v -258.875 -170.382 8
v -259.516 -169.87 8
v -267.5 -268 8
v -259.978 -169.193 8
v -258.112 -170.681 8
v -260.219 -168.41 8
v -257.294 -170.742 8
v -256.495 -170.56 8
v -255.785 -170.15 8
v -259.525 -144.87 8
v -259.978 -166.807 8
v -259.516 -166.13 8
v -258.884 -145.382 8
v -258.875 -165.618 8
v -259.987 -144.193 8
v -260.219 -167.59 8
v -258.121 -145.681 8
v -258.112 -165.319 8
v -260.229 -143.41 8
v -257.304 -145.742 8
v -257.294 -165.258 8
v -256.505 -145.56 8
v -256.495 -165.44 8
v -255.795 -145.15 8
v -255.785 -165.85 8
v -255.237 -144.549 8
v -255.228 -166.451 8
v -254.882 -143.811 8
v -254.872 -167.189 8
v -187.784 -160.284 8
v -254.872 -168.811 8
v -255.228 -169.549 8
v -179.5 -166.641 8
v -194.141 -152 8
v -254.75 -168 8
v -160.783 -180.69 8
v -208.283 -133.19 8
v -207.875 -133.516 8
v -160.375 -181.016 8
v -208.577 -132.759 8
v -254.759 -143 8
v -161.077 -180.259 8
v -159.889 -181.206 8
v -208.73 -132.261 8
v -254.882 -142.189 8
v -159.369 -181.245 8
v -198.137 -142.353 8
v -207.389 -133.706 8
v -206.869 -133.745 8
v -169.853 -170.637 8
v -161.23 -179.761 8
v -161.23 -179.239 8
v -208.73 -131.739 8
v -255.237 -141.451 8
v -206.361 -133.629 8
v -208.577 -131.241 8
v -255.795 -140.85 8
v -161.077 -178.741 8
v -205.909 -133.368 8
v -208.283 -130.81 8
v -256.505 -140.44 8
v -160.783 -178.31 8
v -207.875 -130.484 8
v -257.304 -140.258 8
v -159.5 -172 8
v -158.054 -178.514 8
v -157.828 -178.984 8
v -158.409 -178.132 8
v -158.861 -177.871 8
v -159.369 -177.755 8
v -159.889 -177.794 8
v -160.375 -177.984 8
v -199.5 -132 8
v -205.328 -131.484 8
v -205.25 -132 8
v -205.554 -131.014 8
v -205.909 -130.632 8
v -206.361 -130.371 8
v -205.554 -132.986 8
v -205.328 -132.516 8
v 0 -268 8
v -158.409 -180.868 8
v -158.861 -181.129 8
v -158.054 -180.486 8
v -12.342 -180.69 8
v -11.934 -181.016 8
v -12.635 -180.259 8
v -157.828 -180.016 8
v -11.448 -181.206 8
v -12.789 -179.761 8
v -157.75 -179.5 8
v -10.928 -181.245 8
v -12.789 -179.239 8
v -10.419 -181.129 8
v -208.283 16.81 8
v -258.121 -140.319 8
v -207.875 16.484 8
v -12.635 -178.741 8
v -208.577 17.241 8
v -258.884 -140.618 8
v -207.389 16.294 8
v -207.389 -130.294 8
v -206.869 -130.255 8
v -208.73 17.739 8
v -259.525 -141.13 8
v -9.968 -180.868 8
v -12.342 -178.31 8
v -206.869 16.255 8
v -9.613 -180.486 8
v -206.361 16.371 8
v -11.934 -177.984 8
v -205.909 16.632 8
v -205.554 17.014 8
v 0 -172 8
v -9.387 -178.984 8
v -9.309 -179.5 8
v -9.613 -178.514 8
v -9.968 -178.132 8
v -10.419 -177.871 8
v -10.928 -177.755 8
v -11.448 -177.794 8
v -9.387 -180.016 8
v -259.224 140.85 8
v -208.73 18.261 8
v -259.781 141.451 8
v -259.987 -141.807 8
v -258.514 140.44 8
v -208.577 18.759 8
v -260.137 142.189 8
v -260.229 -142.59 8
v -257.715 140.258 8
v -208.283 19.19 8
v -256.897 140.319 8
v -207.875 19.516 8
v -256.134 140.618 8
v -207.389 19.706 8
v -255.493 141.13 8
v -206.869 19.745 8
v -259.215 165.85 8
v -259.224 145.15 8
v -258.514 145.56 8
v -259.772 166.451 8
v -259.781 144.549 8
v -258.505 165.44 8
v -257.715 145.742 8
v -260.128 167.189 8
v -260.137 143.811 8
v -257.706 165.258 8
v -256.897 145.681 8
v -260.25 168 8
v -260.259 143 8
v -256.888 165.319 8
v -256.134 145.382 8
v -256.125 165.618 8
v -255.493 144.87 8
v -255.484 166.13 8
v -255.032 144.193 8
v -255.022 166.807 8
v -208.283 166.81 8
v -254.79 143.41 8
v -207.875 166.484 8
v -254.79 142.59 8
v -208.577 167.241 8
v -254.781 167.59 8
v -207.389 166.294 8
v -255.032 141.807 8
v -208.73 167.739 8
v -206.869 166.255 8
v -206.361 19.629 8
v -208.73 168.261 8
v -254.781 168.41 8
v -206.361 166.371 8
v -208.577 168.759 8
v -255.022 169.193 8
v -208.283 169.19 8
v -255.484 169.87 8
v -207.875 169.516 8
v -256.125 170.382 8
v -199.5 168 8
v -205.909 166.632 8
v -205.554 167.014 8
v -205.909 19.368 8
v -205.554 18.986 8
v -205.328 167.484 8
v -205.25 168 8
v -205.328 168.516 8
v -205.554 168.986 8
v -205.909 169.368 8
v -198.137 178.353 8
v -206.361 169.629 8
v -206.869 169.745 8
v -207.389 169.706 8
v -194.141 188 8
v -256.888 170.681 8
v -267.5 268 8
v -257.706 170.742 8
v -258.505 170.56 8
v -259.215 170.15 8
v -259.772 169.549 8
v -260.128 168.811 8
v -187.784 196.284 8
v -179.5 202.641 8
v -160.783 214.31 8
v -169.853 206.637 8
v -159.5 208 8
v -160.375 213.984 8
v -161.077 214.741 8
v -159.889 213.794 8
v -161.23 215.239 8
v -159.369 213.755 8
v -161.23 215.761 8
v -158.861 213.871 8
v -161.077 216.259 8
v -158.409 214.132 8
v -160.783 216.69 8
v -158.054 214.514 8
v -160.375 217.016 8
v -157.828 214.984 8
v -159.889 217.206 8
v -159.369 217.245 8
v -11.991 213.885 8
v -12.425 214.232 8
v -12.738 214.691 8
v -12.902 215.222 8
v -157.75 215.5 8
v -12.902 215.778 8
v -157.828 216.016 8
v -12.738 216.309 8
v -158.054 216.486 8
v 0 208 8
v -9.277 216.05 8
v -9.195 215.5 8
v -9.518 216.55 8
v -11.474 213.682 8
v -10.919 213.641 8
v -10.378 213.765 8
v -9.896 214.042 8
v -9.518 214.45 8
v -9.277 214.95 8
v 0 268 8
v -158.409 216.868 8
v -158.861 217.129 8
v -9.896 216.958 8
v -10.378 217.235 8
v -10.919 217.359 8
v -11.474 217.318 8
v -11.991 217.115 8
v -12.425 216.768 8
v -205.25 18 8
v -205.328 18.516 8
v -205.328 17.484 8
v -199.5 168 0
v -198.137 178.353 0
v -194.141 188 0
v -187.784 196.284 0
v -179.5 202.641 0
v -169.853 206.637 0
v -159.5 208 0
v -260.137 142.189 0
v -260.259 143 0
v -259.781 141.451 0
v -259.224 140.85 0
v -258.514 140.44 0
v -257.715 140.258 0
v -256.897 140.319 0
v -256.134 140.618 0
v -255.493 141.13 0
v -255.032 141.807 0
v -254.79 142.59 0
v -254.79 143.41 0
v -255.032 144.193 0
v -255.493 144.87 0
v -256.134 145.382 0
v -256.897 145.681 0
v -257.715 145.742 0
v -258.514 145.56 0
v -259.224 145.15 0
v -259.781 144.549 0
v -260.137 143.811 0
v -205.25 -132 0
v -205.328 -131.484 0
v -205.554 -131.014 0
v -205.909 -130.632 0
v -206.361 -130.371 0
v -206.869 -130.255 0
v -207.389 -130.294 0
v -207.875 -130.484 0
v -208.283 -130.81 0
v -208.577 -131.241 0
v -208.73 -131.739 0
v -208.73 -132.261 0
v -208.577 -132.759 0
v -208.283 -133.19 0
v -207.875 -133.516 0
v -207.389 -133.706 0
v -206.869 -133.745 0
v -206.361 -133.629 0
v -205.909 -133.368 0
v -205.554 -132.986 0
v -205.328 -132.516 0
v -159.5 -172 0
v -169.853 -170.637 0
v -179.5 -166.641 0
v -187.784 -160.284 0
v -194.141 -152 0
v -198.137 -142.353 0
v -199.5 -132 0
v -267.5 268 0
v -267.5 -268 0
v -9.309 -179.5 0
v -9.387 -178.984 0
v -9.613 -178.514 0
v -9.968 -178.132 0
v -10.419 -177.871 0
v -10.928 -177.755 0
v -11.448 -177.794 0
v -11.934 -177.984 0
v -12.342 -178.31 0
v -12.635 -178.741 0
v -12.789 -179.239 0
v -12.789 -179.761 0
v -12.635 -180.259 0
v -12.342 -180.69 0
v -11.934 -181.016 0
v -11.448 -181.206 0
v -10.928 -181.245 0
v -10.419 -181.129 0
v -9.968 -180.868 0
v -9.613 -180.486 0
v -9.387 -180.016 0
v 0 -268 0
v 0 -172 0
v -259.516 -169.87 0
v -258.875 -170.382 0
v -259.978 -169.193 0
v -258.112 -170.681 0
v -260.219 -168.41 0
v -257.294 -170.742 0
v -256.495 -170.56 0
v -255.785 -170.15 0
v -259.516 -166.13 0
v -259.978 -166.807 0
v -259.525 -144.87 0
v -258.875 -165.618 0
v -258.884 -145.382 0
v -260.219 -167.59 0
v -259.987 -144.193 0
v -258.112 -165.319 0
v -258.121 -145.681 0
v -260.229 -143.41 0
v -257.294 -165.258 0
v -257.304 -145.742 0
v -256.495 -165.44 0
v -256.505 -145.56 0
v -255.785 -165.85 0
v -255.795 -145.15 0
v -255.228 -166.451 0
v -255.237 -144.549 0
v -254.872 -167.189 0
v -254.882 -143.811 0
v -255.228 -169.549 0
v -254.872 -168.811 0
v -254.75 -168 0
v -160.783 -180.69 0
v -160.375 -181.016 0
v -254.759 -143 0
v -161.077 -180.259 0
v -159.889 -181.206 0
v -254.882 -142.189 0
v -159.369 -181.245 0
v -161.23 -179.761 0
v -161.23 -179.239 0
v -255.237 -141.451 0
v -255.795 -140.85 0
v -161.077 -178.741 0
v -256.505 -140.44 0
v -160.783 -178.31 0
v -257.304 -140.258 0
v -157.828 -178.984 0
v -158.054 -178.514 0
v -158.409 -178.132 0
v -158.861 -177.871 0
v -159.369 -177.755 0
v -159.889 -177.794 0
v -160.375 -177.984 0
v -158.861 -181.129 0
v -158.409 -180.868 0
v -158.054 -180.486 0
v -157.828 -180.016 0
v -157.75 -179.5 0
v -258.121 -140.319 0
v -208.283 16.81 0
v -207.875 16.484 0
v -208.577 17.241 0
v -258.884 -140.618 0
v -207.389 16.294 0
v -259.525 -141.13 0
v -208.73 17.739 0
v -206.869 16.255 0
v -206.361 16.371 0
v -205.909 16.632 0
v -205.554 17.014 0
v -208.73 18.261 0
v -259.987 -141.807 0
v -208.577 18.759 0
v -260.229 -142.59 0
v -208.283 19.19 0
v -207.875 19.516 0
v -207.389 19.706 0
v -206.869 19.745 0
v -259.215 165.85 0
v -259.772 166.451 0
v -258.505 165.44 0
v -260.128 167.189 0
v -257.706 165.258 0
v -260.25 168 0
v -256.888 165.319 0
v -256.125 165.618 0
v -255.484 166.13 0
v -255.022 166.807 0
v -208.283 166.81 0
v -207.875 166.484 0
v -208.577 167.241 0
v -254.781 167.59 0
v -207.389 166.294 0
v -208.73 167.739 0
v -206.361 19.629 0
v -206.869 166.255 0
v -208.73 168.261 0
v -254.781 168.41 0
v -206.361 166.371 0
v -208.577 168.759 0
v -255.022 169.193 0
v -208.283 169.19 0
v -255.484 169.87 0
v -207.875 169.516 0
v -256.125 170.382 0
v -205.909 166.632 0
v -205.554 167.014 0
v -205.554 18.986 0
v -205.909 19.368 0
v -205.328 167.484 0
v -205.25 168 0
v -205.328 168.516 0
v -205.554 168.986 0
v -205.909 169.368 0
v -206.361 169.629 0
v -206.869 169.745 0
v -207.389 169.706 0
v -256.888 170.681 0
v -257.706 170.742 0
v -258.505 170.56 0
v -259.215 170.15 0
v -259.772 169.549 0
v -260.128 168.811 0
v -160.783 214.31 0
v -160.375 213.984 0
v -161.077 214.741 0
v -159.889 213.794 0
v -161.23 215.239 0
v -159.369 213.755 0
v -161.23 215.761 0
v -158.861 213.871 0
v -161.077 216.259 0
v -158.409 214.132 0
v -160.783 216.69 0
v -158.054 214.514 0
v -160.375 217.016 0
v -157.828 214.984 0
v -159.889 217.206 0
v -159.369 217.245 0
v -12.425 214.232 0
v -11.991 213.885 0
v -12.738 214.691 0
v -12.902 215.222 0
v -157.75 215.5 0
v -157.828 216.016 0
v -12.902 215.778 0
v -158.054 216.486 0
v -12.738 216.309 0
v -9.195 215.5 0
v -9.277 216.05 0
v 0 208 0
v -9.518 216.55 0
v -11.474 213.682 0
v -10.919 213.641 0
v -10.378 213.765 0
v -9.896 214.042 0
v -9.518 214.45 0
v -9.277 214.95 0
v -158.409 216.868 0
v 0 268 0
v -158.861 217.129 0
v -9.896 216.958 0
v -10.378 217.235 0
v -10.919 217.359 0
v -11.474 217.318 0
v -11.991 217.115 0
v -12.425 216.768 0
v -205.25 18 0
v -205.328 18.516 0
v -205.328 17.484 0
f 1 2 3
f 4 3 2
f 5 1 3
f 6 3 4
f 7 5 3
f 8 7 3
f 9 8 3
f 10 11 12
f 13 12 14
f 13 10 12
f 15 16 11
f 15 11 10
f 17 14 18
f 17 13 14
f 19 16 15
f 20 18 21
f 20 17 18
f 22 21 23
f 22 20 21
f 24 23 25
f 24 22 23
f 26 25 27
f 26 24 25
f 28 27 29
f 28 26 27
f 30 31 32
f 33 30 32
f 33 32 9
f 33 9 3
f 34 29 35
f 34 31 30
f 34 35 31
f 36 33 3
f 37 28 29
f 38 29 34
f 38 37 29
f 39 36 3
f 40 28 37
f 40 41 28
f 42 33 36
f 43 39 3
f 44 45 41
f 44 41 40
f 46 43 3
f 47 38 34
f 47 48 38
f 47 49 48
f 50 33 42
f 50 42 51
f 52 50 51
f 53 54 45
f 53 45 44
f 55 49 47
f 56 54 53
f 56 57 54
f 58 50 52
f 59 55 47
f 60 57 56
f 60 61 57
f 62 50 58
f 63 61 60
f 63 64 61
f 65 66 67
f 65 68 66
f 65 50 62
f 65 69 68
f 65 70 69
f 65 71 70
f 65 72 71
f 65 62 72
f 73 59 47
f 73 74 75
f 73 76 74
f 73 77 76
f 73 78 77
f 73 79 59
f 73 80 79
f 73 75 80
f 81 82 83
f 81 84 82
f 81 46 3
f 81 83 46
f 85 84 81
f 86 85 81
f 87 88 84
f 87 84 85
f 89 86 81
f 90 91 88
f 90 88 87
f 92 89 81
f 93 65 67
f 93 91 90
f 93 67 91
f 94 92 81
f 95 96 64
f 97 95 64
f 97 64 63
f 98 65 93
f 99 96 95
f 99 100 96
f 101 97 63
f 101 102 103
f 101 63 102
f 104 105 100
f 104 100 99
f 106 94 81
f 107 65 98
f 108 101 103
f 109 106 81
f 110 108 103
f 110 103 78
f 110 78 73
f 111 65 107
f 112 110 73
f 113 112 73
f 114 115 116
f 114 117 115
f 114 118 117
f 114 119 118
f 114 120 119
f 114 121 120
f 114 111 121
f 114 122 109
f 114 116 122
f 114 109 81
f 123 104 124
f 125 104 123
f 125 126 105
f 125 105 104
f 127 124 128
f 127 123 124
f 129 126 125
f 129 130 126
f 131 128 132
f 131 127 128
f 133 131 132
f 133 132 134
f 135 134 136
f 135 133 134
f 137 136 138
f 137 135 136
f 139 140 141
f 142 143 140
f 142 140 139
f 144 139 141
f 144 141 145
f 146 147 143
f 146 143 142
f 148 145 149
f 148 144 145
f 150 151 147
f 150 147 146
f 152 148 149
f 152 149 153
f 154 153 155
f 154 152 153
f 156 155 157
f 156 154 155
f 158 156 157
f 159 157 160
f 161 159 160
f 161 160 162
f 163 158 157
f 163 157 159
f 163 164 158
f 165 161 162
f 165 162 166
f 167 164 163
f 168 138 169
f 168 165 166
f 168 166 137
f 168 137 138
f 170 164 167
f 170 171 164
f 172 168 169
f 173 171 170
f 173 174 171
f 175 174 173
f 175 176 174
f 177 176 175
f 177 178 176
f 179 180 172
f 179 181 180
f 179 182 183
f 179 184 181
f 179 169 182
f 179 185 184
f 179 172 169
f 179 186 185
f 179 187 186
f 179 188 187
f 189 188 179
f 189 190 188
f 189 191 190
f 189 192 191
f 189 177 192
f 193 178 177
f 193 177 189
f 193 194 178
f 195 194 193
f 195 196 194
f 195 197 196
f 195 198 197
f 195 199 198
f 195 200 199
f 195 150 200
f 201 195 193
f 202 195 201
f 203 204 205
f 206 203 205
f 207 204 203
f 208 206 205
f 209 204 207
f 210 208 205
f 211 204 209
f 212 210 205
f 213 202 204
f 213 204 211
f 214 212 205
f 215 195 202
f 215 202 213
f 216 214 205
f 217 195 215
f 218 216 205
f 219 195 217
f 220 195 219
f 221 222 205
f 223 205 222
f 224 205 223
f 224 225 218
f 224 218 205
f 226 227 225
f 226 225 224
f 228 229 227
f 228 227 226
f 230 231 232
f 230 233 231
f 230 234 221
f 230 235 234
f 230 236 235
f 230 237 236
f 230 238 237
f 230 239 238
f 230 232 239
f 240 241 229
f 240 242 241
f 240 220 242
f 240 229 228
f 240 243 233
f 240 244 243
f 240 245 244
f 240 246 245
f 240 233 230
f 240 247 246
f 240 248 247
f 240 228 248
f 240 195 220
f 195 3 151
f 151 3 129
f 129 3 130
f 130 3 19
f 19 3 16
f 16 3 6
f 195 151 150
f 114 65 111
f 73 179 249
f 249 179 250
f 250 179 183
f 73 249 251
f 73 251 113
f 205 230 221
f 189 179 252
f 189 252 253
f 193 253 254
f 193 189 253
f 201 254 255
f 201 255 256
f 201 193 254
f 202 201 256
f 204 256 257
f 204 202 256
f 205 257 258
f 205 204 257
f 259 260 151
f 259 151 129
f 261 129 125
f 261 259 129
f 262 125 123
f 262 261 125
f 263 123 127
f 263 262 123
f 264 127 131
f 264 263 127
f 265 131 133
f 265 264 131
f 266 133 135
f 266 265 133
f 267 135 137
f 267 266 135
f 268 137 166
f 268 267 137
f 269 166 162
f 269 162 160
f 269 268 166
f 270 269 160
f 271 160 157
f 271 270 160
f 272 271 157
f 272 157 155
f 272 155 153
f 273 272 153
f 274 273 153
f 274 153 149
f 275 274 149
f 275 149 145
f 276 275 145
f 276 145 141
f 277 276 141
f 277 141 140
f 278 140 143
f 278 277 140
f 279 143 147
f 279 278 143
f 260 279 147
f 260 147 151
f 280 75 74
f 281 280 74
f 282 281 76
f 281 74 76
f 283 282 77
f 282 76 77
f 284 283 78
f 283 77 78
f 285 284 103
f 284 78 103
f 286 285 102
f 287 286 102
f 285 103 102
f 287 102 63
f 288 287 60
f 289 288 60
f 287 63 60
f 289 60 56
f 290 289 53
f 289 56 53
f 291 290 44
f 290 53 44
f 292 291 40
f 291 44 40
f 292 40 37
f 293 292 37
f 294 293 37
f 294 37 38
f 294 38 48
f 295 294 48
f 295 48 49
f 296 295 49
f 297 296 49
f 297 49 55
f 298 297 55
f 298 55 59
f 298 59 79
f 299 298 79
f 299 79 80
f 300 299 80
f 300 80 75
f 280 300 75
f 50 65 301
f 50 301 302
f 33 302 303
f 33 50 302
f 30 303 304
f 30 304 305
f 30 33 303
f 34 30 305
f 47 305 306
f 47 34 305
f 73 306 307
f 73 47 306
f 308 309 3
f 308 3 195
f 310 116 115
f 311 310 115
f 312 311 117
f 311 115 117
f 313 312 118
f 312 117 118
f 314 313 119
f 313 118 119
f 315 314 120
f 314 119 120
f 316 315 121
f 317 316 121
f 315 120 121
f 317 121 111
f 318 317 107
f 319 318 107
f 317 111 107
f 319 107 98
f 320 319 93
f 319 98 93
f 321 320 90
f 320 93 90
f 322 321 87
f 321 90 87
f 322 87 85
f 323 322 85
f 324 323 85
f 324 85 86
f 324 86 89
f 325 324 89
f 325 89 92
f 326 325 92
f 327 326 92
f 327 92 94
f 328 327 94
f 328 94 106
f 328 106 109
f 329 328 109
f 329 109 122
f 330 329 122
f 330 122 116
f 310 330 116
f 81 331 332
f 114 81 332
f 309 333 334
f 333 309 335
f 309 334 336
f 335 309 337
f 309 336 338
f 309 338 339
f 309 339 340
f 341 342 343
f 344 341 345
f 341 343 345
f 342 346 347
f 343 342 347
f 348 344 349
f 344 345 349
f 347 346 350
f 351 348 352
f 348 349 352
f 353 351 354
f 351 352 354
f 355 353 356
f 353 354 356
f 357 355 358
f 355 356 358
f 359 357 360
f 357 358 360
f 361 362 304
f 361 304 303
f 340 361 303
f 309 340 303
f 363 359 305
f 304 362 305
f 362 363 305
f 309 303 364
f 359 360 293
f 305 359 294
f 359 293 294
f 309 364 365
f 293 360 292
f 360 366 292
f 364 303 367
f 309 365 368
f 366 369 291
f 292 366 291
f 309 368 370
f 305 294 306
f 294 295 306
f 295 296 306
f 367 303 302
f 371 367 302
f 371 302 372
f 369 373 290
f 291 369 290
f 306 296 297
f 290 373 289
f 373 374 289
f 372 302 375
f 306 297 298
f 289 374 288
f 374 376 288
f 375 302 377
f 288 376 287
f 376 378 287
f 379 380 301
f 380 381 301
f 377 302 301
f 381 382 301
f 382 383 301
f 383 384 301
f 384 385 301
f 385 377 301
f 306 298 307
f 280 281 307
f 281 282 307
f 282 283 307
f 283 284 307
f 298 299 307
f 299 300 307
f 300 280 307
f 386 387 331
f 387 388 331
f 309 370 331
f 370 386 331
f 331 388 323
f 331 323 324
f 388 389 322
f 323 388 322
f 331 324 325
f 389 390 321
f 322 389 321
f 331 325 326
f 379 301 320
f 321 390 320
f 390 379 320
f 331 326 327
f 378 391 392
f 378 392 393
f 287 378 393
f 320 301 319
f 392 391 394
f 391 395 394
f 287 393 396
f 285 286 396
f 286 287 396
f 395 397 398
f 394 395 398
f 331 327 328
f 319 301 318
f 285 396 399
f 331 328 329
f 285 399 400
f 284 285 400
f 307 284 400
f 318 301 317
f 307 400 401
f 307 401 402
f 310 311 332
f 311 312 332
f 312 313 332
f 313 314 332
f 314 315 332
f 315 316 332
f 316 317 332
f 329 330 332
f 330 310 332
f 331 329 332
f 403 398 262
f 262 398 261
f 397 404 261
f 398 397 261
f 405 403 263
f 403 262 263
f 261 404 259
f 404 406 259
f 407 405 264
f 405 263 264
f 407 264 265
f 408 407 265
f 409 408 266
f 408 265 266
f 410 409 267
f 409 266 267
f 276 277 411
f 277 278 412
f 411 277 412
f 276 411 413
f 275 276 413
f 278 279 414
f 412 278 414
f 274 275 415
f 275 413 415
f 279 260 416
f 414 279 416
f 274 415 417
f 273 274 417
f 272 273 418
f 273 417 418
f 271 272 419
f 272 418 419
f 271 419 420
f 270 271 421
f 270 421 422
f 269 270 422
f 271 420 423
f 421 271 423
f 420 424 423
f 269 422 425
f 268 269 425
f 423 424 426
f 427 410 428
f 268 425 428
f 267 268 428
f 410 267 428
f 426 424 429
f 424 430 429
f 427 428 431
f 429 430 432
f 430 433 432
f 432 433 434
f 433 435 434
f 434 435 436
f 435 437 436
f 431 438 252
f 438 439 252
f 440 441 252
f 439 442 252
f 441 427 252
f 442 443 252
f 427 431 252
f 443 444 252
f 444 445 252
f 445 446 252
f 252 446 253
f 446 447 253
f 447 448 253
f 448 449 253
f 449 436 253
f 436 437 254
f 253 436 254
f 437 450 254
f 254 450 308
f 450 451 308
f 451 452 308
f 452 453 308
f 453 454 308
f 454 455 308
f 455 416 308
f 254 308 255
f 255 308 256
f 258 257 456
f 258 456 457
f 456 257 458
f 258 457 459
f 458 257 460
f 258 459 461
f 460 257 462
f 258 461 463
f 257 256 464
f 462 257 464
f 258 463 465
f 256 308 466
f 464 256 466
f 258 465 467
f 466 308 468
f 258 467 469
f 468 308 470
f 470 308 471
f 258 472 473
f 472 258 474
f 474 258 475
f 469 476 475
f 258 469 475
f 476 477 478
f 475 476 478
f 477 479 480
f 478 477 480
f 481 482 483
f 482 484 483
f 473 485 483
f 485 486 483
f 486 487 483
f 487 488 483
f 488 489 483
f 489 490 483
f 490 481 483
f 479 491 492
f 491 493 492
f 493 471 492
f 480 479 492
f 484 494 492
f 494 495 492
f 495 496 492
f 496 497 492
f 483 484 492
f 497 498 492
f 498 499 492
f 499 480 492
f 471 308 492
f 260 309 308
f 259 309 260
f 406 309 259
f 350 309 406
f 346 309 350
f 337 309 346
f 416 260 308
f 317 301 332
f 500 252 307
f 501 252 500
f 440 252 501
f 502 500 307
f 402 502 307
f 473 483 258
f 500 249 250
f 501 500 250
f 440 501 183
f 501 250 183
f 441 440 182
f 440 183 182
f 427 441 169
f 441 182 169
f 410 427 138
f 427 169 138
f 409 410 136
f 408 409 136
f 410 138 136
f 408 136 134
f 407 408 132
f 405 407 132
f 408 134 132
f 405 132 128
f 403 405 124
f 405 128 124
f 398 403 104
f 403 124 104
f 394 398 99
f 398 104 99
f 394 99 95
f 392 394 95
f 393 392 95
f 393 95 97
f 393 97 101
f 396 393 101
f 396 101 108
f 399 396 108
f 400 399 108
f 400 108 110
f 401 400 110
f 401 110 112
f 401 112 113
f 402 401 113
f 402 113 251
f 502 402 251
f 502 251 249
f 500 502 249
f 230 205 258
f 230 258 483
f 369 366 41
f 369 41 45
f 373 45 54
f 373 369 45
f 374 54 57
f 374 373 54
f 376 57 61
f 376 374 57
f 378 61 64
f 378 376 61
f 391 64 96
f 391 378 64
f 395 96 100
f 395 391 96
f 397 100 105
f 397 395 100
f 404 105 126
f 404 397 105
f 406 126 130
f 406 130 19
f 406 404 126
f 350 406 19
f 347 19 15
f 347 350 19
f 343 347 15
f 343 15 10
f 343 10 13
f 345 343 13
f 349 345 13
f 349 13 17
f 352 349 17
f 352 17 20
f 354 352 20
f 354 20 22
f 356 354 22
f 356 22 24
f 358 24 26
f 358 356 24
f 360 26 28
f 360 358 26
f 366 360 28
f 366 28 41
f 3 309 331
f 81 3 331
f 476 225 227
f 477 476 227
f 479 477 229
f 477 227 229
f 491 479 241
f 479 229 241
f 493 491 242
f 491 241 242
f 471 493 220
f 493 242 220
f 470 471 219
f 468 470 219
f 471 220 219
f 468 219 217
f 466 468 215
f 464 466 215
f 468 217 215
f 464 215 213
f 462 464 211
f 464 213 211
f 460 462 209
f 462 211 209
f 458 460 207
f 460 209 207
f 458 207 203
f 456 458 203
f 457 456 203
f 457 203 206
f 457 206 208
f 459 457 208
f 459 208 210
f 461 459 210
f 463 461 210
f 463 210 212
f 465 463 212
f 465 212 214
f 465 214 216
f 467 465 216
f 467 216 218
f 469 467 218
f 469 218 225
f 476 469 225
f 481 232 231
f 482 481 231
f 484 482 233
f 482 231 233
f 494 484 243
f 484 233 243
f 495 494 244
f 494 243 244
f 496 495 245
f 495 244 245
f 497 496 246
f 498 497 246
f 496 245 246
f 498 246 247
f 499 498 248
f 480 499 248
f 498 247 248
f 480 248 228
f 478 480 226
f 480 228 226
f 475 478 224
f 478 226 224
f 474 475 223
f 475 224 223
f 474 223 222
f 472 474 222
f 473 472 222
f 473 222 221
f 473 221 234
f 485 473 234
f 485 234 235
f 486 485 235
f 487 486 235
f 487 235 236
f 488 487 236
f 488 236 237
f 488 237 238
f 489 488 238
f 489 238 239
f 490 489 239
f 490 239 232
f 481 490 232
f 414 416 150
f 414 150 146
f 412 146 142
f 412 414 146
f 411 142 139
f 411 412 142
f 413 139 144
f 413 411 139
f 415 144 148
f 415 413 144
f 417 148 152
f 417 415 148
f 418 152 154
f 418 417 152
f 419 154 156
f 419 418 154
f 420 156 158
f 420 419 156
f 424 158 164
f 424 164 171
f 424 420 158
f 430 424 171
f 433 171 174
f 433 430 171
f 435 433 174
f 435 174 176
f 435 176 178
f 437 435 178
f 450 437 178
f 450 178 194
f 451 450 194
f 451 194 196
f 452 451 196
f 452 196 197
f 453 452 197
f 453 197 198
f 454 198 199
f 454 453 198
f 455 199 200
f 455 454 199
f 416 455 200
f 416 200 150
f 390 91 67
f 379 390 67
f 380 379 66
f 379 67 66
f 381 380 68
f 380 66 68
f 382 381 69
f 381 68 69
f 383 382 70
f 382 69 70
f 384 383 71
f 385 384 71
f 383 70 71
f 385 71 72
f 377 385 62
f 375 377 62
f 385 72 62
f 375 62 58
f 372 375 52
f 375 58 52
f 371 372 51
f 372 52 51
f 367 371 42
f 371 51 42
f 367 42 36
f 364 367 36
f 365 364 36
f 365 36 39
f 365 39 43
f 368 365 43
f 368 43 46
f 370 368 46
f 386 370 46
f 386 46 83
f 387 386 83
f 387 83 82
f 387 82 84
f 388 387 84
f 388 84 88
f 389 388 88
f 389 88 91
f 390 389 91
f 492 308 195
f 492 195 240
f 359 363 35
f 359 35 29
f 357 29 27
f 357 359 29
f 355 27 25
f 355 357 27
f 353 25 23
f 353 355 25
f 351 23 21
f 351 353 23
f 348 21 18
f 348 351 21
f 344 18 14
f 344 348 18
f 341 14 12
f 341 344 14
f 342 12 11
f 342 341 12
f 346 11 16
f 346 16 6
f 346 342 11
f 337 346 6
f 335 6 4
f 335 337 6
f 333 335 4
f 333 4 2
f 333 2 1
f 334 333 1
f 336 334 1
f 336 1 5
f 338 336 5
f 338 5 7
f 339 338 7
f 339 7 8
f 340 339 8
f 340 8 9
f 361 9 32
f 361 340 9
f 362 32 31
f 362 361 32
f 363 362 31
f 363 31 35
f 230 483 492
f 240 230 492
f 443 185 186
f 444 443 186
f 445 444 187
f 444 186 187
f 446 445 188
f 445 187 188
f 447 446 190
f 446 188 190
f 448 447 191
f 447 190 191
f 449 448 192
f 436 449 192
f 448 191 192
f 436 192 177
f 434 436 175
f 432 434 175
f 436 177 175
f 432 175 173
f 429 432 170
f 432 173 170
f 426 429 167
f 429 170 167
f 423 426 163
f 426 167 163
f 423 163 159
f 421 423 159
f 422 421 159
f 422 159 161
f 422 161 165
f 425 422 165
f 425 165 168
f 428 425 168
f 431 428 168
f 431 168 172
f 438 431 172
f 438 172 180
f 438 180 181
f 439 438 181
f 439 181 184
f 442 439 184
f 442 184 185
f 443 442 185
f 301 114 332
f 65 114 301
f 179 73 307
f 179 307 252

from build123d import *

# Parameters (mm, degrees)
SKETCH1_W           = 267.5
SKETCH1_H           = 536
SKETCH1_R           = 2.75
BOSS_EXTRUDE1_DEPTH = 8
CUT_EXTRUDE1_DEPTH  = 8
SKETCH3_R           = 1.864271291
SKETCH3_R_2         = 1.75
CUT_EXTRUDE2_DEPTH  = 10


with BuildPart() as part:
    # Sketch1 → Boss-Extrude1 (new body)
    with BuildSketch(Plane.XY):
        with Locations((-133.75, 0)):
            Rectangle(SKETCH1_W, SKETCH1_H)
        with Locations((-257.509341423, -143.000001745)):
            Circle(SKETCH1_R, mode=Mode.SUBTRACT)
        with Locations(Location((-257.5, 168, 0), (0, 0, 180))):
            Circle(SKETCH1_R, mode=Mode.SUBTRACT)
        with Locations(Location((-257.509341423, 143.000001745, 0), (0, 0, 180))):
            Circle(SKETCH1_R, mode=Mode.SUBTRACT)
        with Locations((-257.5, -168)):
            Circle(SKETCH1_R, mode=Mode.SUBTRACT)
    extrude(amount=BOSS_EXTRUDE1_DEPTH)

    # Sketch2 → Cut-Extrude1 (cut)
    with BuildSketch(Plane.XY.offset(8)):
        with BuildLine():
            Line((-159.5, 208), (160.5, 208))
            ThreePointArc((160.5, 208), (188.784271247, 196.284271247), (200.5, 168))
            Line((200.5, 168), (200.5, -132))
            ThreePointArc((200.5, -132), (188.784271247, -160.284271247), (160.5, -172))
            Line((160.5, -172), (-159.5, -172))
            ThreePointArc((-159.5, -172), (-187.784271247, -160.284271247), (-199.5, -132))
            Line((-199.5, -132), (-199.5, 168))
            ThreePointArc((-199.5, 168), (-187.784271247, 196.284271247), (-159.5, 208))
        make_face()
    extrude(amount=-CUT_EXTRUDE1_DEPTH, mode=Mode.SUBTRACT)

    # Sketch3 → Cut-Extrude2 (cut)
    with BuildSketch(Plane.XY.offset(8)):
        with Locations((-11.058771906, 215.5)):
            Circle(SKETCH3_R)
        with Locations((-159.5, 215.5)):
            Circle(SKETCH3_R_2)
        with Locations((-207, 168)):
            Circle(SKETCH3_R_2)
        with Locations((-207, 18)):
            Circle(SKETCH3_R_2)
        with Locations((-207, -132)):
            Circle(SKETCH3_R_2)
        with Locations((-159.5, -179.5)):
            Circle(SKETCH3_R_2)
        with Locations((-11.058771906, -179.5)):
            Circle(SKETCH3_R_2)
    extrude(amount=-CUT_EXTRUDE2_DEPTH, mode=Mode.SUBTRACT)


solid = part.part
